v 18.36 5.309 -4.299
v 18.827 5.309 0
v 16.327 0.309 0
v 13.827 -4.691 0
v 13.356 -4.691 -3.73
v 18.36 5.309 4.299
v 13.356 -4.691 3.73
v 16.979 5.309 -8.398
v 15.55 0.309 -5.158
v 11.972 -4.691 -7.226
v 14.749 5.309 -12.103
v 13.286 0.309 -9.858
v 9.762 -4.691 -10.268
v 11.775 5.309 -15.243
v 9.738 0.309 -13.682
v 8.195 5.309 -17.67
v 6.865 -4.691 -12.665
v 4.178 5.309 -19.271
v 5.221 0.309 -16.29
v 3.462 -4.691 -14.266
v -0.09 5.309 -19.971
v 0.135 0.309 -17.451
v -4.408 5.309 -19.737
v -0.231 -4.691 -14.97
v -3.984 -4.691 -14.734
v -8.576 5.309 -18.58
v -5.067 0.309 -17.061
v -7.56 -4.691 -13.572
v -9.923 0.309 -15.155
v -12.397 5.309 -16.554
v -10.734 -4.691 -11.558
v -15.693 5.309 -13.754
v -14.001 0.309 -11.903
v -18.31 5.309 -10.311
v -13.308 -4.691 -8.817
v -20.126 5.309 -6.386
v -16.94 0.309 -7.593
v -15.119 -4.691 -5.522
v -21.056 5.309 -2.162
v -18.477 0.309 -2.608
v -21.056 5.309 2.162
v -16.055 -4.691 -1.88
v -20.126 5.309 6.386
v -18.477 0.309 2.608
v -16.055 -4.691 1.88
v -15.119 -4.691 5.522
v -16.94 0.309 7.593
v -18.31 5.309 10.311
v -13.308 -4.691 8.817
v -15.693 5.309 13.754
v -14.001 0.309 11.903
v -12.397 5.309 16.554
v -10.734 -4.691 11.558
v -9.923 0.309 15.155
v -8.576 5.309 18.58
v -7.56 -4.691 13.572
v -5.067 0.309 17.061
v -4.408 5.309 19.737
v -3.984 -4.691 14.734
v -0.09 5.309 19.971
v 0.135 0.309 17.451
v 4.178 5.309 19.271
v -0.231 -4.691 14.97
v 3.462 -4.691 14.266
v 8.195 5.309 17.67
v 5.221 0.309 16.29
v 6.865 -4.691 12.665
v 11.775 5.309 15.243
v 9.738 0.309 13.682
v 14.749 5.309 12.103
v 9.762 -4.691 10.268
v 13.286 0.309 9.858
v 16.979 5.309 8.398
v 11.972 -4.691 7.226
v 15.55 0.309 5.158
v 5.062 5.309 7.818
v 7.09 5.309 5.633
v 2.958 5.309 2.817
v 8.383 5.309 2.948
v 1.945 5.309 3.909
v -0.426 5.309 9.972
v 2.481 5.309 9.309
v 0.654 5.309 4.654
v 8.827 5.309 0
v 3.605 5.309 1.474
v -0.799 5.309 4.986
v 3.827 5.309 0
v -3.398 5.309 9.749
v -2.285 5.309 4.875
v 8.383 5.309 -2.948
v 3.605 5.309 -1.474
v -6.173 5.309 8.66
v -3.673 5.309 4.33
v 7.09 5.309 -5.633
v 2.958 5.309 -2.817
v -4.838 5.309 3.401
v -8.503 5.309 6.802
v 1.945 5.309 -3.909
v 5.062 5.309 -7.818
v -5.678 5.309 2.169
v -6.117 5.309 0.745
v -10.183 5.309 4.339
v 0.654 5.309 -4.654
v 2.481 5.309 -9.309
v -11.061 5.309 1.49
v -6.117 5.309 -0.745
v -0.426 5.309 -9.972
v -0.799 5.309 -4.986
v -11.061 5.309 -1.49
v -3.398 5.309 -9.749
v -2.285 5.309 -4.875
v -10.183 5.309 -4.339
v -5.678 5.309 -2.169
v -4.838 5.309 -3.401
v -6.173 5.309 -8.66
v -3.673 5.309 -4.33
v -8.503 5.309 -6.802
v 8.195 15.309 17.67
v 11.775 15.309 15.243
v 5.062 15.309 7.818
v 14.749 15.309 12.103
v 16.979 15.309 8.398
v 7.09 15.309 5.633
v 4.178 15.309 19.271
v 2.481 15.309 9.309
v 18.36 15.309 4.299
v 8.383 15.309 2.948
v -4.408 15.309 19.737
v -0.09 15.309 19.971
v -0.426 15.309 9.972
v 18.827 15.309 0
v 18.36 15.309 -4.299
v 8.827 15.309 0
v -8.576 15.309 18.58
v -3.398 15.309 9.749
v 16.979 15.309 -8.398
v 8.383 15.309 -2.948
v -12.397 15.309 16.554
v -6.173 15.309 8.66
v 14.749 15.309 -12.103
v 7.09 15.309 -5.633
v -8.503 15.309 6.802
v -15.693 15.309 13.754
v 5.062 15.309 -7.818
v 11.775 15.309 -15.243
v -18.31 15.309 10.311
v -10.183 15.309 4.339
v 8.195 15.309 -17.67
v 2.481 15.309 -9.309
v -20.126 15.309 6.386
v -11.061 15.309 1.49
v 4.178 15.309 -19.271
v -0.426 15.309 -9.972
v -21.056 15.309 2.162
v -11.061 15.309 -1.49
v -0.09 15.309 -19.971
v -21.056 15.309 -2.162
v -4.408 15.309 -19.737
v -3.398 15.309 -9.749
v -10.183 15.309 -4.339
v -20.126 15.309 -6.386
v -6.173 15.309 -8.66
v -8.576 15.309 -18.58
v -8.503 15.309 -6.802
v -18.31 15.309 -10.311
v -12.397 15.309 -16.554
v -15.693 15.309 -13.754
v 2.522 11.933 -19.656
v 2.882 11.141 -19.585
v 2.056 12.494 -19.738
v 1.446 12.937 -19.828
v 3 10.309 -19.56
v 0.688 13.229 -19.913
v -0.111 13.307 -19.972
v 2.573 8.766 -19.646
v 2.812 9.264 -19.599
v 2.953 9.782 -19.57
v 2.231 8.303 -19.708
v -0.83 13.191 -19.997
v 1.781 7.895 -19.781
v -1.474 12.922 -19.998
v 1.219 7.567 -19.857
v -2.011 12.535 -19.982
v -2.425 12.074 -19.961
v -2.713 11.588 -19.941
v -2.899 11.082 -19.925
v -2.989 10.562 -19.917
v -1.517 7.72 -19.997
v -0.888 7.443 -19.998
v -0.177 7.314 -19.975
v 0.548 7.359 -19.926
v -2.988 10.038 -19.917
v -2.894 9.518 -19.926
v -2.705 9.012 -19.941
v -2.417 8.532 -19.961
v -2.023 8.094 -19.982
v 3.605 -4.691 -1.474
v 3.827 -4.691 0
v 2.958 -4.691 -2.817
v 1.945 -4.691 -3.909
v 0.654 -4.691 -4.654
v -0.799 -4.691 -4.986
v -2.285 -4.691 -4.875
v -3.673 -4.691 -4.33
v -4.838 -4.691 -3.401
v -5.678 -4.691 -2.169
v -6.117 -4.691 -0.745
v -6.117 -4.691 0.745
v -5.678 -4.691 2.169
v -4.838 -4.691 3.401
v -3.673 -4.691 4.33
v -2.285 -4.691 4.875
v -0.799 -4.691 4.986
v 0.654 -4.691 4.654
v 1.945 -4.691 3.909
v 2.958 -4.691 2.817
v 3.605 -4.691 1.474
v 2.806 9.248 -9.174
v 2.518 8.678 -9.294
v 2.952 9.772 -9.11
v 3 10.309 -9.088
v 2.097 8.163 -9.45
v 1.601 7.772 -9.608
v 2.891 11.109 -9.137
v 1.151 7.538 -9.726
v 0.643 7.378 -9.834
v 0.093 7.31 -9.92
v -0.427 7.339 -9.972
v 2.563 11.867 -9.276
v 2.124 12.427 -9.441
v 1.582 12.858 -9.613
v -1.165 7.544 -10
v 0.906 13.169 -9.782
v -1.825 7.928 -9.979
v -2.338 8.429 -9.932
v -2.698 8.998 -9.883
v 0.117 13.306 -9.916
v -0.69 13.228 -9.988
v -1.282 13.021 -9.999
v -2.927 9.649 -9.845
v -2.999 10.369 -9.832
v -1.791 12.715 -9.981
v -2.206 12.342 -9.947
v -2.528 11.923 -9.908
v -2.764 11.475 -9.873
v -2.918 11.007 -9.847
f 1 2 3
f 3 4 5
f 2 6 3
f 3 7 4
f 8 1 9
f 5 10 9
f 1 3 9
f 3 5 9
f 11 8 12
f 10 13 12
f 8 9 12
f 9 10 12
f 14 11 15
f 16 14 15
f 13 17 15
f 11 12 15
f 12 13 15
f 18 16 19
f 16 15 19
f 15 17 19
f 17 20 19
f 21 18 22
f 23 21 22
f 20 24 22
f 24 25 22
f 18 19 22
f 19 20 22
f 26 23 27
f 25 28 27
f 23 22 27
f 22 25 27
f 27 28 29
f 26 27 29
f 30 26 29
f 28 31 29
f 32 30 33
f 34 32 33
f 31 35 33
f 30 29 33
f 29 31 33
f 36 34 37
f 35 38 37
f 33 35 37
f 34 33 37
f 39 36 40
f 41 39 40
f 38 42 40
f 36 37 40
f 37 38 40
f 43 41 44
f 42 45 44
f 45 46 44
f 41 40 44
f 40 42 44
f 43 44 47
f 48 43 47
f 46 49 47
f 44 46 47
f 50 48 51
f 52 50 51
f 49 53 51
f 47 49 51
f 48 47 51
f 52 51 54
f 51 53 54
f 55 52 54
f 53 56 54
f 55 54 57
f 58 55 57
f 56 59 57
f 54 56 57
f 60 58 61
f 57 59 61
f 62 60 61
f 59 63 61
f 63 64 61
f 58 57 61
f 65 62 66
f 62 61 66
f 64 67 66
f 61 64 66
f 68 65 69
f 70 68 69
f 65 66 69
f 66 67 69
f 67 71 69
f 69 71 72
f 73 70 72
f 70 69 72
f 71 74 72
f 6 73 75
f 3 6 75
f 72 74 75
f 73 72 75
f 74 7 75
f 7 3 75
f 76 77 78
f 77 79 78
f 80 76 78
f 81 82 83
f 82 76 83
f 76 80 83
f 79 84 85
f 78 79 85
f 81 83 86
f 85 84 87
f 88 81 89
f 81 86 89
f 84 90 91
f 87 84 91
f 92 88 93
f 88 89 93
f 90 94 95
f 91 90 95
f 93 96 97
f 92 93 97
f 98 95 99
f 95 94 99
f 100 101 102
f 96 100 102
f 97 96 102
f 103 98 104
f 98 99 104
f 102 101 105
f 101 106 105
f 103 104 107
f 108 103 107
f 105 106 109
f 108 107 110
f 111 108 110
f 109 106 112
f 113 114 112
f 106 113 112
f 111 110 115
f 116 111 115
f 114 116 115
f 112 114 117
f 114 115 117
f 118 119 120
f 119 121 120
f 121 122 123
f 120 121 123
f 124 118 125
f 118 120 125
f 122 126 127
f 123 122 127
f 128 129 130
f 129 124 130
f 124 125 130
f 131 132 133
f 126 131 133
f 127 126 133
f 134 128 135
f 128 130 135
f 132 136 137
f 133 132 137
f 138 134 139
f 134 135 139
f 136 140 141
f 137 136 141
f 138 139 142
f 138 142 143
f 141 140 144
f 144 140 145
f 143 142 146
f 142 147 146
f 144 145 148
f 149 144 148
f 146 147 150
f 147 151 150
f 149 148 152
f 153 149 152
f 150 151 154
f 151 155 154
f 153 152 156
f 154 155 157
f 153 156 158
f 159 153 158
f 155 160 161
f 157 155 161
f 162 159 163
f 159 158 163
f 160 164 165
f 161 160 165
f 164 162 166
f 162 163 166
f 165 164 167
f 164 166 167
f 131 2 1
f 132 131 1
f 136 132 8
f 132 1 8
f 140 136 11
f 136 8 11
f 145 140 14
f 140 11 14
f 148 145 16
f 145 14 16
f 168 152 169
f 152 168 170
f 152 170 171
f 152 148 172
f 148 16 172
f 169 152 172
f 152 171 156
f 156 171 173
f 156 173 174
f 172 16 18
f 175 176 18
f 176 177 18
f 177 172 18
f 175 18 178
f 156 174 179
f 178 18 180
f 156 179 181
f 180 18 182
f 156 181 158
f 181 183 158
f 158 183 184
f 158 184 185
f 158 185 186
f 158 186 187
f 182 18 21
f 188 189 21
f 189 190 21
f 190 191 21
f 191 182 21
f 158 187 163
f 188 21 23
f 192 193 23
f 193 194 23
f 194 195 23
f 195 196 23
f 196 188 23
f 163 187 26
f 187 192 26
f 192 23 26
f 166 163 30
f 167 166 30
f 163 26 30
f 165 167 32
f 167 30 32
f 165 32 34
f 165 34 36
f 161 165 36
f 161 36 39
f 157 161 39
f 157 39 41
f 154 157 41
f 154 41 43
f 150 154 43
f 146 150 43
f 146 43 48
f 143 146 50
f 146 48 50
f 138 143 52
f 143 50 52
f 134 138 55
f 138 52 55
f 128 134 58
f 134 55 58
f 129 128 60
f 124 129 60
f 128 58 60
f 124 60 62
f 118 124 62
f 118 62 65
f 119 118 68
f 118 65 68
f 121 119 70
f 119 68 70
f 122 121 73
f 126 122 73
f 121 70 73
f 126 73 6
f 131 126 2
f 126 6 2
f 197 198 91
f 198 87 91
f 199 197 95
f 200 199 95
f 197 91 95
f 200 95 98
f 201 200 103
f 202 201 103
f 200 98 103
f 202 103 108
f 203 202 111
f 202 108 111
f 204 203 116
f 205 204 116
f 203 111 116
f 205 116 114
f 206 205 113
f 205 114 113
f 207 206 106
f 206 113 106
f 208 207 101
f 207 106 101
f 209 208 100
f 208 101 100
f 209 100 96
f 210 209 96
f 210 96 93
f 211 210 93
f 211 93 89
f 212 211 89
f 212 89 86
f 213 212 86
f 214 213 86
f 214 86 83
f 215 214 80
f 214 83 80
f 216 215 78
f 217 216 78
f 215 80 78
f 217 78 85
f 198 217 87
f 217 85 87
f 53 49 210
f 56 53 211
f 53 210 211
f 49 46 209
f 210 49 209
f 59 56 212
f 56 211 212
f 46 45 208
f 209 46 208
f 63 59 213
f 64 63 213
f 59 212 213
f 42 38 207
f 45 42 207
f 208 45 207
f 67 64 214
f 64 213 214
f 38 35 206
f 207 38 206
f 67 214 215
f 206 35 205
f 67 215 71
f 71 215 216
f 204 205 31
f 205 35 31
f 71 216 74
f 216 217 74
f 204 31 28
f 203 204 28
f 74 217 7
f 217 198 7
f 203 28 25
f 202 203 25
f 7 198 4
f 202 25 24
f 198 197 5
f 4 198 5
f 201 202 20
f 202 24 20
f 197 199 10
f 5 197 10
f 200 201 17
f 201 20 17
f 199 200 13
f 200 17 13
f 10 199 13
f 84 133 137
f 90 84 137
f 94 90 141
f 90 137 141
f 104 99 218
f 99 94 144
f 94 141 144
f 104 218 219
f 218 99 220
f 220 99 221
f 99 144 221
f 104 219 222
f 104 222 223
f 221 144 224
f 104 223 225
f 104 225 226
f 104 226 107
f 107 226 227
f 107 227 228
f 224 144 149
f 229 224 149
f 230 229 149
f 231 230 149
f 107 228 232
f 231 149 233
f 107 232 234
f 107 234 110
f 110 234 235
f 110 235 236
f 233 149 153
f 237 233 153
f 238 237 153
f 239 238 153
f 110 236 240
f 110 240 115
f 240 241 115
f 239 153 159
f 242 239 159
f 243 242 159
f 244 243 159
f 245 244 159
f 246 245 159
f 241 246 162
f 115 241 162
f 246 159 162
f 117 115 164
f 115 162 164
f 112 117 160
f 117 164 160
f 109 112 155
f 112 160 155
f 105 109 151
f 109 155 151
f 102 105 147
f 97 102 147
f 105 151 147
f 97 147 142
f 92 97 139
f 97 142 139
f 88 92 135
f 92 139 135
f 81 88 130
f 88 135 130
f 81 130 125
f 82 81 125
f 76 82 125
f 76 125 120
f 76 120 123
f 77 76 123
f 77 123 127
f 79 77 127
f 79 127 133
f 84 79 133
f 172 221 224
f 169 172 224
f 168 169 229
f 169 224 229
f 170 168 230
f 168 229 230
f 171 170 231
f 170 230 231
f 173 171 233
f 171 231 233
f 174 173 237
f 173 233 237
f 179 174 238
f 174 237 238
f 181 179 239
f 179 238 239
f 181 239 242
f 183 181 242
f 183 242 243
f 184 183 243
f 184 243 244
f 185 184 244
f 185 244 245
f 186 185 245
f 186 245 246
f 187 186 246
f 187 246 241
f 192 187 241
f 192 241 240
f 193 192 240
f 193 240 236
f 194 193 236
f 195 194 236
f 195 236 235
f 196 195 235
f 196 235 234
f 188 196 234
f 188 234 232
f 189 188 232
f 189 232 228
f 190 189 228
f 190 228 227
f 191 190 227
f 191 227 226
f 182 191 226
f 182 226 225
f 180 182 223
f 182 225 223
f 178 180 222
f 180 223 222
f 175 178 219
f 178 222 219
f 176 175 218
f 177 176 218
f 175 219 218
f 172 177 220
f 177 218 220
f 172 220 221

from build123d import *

# Parameters (mm, degrees)
SKETCH2_R          = 3
CUT_EXTRUDE1_DEPTH = 23


with BuildPart() as part:
    # Sketch1 → Revolve1 (revolve)
    with BuildSketch(Plane.XY):
        Polygon((8.827160494, 15.308641975), (18.827160494, 15.308641975), (18.827160494, 5.308641975), (13.827160494, -4.691358025), (3.827160494, -4.691358025), (3.827160494, 5.308641975), (8.827160494, 5.308641975), align=None)
    revolve(axis=Axis((-1.172839506, 0, 0), (0, 1, 0)))

    # Sketch2 → Cut-Extrude1 (cut)
    with BuildSketch(Plane.XY):
        with Locations((0, 10.308641975)):
            Circle(SKETCH2_R)
    extrude(amount=-CUT_EXTRUDE1_DEPTH, mode=Mode.SUBTRACT)


solid = part.part
